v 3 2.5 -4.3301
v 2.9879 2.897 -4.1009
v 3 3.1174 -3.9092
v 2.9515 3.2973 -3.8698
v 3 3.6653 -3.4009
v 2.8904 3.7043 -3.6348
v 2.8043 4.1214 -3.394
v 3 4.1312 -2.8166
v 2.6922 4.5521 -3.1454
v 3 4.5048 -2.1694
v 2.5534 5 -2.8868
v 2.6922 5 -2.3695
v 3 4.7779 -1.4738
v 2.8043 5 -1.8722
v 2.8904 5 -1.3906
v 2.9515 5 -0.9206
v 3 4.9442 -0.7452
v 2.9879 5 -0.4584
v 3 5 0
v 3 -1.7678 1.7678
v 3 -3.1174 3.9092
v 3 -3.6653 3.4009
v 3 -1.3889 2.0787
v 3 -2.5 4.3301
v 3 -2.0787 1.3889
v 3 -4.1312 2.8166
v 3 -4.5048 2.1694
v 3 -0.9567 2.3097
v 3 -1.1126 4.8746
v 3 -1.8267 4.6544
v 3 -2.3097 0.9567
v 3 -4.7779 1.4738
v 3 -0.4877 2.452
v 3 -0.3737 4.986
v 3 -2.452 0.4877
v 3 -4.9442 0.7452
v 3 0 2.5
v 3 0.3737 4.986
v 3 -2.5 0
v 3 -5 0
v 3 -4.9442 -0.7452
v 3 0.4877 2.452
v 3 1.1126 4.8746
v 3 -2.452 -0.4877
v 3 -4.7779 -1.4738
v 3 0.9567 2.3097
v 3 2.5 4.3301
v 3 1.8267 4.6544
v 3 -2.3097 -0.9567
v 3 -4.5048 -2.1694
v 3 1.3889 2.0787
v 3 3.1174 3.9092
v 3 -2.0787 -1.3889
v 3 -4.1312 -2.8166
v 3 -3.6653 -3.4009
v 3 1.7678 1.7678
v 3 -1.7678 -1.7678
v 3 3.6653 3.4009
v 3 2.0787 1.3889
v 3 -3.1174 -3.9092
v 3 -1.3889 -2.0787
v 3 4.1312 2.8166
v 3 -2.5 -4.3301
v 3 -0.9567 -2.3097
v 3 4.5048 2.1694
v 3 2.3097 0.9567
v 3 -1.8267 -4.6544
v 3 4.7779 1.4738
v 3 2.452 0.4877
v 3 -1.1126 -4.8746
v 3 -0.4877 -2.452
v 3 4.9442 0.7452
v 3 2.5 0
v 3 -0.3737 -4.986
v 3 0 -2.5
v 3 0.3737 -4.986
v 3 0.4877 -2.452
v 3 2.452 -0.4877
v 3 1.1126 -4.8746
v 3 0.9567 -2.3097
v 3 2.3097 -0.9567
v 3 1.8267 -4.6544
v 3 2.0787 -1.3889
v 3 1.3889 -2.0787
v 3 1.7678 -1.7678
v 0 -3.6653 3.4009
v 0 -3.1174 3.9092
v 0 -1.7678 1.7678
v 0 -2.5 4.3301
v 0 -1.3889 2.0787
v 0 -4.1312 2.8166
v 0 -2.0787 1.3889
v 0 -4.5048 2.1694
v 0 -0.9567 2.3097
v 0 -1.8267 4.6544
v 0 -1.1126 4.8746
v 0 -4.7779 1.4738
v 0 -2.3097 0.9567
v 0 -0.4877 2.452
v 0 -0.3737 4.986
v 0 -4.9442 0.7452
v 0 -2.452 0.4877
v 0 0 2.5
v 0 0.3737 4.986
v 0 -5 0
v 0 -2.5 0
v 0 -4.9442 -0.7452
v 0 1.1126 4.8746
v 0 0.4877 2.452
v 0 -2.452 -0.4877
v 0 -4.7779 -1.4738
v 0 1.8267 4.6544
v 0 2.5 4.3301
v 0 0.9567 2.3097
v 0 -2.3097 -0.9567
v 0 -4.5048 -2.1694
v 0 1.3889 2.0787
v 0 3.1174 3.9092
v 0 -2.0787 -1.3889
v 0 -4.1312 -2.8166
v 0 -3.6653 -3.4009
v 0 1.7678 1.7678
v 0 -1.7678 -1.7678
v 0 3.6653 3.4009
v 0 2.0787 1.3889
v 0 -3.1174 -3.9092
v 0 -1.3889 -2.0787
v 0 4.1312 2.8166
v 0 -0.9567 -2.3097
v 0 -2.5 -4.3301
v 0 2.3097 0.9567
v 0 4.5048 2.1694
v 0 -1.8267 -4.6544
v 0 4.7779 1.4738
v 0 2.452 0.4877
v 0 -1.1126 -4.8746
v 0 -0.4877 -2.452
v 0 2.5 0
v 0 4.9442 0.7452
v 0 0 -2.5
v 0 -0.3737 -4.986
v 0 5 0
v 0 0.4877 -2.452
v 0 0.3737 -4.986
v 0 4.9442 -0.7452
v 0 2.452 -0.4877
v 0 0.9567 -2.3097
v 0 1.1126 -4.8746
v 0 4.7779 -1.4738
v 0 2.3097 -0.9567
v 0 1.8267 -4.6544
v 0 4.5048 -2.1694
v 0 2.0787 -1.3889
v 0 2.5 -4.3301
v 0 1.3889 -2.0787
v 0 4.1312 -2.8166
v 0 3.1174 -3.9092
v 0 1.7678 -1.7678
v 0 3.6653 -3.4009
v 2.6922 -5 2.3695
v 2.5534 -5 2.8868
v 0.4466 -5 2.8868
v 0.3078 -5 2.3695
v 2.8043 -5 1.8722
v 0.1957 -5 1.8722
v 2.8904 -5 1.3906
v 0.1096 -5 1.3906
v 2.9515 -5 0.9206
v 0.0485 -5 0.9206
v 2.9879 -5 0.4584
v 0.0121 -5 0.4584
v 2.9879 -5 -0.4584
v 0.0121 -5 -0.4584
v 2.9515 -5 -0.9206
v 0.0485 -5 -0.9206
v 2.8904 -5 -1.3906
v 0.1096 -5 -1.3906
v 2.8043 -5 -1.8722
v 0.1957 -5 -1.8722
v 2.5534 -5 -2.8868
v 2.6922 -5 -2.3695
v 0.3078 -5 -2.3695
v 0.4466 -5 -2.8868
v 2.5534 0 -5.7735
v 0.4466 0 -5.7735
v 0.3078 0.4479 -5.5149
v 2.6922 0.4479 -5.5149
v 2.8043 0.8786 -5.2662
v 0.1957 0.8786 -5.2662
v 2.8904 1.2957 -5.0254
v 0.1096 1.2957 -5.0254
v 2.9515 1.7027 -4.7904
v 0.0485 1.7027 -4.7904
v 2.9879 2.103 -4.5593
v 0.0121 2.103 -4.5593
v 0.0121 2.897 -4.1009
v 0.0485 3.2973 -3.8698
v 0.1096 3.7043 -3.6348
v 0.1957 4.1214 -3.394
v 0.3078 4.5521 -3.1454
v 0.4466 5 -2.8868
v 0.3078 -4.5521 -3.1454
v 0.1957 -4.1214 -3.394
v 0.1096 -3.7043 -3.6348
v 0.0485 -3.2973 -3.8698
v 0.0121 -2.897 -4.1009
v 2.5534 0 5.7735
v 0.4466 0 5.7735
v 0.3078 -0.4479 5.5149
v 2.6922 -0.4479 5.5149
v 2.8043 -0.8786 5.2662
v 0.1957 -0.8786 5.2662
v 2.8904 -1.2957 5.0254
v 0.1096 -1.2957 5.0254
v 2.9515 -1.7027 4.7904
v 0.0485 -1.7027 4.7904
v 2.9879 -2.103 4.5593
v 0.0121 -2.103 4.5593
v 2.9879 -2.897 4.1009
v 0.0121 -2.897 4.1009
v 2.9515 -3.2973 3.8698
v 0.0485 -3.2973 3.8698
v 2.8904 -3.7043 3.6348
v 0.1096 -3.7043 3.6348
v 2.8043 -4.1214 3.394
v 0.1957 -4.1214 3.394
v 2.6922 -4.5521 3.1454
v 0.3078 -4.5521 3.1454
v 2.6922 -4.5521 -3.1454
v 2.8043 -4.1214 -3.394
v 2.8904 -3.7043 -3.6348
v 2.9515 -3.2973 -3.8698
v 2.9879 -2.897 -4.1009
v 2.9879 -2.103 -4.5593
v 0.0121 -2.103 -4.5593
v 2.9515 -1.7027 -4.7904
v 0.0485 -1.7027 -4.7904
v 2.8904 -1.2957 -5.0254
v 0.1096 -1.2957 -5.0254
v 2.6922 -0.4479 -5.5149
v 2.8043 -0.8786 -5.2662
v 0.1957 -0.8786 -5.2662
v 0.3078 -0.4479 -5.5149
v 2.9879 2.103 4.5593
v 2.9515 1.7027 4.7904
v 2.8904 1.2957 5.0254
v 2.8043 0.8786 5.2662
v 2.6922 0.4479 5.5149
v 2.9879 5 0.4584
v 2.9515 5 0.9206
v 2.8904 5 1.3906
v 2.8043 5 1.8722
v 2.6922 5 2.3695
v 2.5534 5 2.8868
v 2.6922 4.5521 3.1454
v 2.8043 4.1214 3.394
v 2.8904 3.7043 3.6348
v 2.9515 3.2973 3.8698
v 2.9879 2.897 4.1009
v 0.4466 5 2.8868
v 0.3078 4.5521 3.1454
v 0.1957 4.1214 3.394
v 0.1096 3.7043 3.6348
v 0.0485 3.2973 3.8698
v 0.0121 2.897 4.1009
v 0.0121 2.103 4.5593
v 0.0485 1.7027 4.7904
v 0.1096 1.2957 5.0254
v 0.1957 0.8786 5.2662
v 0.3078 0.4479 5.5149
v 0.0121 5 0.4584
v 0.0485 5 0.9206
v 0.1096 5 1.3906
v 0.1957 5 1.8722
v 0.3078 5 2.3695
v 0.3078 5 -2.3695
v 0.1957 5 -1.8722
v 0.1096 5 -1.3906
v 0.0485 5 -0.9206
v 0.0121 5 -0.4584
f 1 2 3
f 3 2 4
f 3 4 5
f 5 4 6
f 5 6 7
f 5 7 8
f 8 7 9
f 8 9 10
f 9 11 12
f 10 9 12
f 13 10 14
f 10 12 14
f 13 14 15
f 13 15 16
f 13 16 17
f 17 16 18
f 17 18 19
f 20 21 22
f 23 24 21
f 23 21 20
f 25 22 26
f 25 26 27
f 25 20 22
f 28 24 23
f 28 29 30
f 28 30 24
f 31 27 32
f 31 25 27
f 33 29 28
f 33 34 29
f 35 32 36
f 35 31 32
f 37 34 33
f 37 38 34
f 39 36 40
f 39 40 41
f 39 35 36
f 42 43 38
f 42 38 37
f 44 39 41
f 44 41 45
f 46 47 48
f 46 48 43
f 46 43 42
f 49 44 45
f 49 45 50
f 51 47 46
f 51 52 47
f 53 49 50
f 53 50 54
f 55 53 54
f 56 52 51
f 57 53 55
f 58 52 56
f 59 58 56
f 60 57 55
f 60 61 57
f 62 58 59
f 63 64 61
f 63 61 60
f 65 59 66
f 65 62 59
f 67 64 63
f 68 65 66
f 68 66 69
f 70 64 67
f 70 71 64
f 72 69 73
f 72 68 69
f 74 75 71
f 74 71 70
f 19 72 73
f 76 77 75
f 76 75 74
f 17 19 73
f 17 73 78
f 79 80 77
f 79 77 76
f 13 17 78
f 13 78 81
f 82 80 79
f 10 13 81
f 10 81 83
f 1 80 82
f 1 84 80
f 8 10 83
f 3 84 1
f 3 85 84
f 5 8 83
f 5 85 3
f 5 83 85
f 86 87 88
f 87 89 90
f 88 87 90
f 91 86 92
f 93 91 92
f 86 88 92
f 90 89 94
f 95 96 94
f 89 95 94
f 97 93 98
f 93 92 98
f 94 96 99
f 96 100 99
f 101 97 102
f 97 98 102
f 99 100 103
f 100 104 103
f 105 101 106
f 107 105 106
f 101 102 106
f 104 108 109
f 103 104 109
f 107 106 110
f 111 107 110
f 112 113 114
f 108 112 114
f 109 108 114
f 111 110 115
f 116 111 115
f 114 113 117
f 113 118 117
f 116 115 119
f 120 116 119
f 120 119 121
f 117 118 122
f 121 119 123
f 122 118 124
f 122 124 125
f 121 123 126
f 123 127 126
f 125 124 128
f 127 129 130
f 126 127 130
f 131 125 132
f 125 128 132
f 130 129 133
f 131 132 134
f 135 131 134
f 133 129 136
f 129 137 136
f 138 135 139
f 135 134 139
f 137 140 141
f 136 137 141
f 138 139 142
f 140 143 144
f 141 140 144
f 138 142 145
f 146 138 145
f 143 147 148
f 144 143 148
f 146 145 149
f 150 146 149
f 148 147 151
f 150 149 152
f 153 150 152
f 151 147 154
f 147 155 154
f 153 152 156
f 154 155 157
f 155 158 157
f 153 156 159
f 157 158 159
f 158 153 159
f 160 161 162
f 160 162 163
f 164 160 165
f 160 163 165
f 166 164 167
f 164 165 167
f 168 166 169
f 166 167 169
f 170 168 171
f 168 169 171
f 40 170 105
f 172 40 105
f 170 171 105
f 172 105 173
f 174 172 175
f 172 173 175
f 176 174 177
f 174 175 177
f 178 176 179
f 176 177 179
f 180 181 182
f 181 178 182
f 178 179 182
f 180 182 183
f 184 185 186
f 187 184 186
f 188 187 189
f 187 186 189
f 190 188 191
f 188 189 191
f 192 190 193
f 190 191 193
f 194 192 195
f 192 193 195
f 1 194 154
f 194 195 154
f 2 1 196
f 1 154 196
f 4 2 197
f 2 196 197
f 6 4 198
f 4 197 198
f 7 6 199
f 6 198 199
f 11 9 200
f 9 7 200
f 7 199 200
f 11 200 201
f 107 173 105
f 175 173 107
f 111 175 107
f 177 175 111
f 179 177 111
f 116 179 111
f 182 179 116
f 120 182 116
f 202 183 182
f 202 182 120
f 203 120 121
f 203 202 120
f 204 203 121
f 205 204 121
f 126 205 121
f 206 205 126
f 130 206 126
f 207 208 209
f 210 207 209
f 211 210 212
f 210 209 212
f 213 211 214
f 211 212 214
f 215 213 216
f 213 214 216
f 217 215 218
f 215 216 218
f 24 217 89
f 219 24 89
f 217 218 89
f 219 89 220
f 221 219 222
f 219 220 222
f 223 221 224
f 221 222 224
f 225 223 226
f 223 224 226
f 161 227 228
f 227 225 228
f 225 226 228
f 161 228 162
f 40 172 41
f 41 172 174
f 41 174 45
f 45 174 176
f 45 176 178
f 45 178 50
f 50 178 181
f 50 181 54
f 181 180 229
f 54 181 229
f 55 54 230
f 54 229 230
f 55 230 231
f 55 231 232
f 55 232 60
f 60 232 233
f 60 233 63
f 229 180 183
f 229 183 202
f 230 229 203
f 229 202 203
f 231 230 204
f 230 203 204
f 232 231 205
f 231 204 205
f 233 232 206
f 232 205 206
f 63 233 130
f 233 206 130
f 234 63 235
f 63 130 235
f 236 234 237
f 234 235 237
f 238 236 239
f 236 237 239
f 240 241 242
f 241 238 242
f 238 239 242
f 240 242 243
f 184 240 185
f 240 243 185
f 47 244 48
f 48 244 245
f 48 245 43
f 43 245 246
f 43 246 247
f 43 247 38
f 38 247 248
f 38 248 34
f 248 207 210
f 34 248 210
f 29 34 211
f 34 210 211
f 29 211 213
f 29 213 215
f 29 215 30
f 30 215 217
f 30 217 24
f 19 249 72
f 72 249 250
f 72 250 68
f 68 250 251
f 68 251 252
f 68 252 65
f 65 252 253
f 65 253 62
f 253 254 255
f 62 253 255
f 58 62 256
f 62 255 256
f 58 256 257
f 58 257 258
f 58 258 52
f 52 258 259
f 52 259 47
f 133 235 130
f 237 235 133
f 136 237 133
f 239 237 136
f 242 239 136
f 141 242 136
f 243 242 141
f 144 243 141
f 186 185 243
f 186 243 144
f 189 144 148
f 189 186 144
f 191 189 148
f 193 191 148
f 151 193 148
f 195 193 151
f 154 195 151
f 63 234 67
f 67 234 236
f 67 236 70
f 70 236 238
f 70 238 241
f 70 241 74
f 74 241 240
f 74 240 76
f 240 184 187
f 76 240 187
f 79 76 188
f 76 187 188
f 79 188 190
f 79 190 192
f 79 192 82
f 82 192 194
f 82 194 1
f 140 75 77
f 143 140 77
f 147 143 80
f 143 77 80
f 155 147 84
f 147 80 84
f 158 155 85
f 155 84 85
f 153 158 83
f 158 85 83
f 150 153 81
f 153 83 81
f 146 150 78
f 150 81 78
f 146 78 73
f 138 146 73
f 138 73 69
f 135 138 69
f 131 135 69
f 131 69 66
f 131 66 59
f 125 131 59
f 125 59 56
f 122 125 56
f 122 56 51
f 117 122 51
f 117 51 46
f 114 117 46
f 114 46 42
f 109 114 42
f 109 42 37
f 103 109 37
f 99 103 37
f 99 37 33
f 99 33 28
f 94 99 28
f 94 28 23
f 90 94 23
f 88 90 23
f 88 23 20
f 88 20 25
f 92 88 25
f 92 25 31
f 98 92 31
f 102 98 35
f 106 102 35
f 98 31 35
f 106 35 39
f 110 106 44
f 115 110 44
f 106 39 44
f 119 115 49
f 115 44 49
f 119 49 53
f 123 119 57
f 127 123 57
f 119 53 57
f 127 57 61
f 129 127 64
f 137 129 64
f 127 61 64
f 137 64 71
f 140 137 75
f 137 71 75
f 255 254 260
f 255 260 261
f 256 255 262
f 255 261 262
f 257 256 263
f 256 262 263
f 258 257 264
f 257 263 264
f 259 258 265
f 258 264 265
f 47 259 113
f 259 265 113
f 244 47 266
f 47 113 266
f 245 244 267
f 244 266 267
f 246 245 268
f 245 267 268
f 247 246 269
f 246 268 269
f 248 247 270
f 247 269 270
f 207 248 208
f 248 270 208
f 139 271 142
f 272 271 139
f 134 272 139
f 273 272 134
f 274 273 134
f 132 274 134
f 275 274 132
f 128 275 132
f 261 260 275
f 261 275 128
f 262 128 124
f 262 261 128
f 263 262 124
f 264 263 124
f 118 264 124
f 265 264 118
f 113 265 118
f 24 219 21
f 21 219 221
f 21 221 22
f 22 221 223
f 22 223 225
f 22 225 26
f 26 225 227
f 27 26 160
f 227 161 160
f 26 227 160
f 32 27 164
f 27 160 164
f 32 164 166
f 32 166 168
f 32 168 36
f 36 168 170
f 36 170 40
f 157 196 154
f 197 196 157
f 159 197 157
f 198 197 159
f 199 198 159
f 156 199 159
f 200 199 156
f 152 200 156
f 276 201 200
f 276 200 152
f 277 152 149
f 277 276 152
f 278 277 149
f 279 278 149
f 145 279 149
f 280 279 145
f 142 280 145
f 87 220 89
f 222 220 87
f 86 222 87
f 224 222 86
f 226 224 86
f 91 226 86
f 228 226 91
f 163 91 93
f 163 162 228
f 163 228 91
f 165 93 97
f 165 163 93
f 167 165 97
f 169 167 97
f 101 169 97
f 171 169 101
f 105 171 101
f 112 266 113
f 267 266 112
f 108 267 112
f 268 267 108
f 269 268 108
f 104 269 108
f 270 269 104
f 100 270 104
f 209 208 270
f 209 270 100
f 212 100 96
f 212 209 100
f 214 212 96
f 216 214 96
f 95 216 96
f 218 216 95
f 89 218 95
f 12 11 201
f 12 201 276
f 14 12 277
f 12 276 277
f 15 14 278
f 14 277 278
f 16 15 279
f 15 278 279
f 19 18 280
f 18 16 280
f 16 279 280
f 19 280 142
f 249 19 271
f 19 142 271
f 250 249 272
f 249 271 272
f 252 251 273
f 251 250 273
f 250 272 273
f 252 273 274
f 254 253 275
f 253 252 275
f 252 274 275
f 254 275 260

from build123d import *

# Parameters (mm, degrees)
BOSS_EXTRUDE1_DEPTH = 3
TAPPED_HOLE1_D      = 5


with BuildPart() as part:
    # Sketch1 → Boss-Extrude1 (new body)
    with BuildSketch(Plane(origin=(0, 0, 0), x_dir=(0, 0, -1), z_dir=(1, 0, 0))):
        Polygon((5.773502692, 0), (2.886751346, 5), (-2.886751346, 5), (-5.773502692, 0), (-2.886751346, -5), (2.886751346, -5), align=None)
    extrude(amount=BOSS_EXTRUDE1_DEPTH)

    # Tapped Hole1 (through all)
    with Locations(Plane.ZY):
        with Locations((0, 0)):
            Hole(TAPPED_HOLE1_D / 2)

    # Sketch6 → Cut-Revolve1 (revolve, cut)
    with BuildSketch(Plane(origin=(0, 0, 0), x_dir=(1, 0, 0), z_dir=(0, 1, 0))):
        Polygon((0, 5), (0.446581987, 5.773502692), (0, 5.773502692), align=None)
    cut_revolve1 = revolve(axis=Axis((0, 0, 0), (1, 0, 0)), mode=Mode.SUBTRACT)

    # Mirror1: Cut-Revolve1 across plane
    add(cut_revolve1.mirror(Plane.ZY.offset(-1.5)), mode=Mode.SUBTRACT)


solid = part.part
